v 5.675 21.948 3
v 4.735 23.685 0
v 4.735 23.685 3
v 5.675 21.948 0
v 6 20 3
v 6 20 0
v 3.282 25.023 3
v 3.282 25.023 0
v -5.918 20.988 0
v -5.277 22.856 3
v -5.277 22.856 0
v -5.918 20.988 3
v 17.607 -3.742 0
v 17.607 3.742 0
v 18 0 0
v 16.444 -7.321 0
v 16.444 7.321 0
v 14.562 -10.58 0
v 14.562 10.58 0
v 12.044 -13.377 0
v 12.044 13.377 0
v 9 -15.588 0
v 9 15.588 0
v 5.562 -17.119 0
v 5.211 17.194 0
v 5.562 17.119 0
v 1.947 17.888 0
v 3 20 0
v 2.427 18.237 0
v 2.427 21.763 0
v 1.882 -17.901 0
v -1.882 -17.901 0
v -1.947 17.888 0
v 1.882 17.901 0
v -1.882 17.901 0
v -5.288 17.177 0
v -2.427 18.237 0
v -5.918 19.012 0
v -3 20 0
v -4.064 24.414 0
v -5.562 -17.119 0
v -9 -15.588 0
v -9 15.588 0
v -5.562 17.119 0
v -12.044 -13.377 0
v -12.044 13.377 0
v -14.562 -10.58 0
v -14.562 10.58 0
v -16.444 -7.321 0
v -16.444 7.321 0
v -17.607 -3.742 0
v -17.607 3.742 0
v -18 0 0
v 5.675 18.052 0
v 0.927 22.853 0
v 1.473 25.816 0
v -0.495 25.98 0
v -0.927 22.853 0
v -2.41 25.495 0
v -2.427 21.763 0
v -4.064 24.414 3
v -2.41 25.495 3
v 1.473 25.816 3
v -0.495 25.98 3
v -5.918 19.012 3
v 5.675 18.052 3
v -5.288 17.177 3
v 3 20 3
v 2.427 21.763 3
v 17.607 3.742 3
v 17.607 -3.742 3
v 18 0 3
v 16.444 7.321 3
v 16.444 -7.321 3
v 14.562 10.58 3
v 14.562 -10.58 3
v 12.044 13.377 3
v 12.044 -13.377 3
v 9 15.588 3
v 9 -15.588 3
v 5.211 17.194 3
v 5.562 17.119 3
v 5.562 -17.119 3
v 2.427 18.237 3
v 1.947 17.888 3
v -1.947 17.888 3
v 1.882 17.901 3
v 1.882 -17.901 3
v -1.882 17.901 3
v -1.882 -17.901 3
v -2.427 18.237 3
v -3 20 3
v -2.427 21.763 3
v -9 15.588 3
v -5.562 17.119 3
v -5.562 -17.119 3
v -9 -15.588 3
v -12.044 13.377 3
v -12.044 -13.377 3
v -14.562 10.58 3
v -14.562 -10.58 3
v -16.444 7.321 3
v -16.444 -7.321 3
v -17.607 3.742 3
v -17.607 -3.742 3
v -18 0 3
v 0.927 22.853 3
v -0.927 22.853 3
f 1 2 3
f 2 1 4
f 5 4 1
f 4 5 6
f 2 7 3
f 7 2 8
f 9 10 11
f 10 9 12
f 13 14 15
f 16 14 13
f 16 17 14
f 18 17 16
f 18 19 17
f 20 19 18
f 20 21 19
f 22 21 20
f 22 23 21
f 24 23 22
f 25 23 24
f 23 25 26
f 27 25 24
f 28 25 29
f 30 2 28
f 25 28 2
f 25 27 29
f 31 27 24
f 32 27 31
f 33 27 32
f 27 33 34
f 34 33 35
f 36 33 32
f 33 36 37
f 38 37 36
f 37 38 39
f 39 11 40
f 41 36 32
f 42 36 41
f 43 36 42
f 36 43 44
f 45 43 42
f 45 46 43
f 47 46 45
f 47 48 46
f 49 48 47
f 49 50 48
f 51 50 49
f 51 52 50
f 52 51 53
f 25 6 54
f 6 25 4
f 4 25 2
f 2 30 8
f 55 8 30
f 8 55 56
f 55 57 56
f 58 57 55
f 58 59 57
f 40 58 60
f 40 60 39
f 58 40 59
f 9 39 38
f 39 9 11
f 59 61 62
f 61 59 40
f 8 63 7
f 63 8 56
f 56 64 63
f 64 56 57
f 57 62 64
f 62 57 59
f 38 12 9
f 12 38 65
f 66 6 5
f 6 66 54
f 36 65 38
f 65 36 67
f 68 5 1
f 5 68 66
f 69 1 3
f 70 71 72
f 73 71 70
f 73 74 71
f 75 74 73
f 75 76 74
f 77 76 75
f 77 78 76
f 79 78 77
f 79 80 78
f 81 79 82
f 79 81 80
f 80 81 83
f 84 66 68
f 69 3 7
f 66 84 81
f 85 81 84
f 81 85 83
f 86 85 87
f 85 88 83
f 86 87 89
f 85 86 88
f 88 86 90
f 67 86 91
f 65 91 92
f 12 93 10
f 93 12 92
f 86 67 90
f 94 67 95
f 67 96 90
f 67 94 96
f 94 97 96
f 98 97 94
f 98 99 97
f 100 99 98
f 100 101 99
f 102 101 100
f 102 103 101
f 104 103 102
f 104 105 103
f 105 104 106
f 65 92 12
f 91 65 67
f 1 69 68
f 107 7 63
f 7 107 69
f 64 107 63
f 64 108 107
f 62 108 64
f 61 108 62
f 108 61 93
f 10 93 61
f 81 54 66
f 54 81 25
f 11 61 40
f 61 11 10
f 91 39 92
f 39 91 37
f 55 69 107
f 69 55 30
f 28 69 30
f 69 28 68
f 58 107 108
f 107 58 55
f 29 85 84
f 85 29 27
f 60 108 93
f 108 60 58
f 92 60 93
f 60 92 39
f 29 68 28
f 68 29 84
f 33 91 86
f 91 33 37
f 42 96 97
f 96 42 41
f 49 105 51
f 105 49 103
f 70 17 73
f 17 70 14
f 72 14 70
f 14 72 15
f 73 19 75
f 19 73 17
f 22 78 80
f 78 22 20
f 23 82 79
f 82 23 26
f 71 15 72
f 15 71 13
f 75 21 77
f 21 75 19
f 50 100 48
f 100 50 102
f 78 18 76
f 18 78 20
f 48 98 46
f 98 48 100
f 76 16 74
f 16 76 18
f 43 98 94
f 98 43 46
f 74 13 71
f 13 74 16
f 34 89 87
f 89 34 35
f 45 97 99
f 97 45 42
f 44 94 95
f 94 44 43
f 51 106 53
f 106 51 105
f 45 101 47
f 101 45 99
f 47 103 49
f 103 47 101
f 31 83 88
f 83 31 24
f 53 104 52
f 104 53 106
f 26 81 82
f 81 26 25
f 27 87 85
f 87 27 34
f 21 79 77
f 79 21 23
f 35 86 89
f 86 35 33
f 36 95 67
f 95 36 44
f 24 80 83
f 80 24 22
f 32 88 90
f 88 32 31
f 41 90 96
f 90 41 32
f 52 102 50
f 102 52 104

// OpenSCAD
altura = 3;

union() {
    cylinder(h=altura, r=18); // Círculo
    
    // Argola
    translate([0, 20, 0]) 
    difference() {
        cylinder(h=altura, r=6);
        translate([0, 0, -1]) cylinder(h=altura+2, r=3);
    }
}
